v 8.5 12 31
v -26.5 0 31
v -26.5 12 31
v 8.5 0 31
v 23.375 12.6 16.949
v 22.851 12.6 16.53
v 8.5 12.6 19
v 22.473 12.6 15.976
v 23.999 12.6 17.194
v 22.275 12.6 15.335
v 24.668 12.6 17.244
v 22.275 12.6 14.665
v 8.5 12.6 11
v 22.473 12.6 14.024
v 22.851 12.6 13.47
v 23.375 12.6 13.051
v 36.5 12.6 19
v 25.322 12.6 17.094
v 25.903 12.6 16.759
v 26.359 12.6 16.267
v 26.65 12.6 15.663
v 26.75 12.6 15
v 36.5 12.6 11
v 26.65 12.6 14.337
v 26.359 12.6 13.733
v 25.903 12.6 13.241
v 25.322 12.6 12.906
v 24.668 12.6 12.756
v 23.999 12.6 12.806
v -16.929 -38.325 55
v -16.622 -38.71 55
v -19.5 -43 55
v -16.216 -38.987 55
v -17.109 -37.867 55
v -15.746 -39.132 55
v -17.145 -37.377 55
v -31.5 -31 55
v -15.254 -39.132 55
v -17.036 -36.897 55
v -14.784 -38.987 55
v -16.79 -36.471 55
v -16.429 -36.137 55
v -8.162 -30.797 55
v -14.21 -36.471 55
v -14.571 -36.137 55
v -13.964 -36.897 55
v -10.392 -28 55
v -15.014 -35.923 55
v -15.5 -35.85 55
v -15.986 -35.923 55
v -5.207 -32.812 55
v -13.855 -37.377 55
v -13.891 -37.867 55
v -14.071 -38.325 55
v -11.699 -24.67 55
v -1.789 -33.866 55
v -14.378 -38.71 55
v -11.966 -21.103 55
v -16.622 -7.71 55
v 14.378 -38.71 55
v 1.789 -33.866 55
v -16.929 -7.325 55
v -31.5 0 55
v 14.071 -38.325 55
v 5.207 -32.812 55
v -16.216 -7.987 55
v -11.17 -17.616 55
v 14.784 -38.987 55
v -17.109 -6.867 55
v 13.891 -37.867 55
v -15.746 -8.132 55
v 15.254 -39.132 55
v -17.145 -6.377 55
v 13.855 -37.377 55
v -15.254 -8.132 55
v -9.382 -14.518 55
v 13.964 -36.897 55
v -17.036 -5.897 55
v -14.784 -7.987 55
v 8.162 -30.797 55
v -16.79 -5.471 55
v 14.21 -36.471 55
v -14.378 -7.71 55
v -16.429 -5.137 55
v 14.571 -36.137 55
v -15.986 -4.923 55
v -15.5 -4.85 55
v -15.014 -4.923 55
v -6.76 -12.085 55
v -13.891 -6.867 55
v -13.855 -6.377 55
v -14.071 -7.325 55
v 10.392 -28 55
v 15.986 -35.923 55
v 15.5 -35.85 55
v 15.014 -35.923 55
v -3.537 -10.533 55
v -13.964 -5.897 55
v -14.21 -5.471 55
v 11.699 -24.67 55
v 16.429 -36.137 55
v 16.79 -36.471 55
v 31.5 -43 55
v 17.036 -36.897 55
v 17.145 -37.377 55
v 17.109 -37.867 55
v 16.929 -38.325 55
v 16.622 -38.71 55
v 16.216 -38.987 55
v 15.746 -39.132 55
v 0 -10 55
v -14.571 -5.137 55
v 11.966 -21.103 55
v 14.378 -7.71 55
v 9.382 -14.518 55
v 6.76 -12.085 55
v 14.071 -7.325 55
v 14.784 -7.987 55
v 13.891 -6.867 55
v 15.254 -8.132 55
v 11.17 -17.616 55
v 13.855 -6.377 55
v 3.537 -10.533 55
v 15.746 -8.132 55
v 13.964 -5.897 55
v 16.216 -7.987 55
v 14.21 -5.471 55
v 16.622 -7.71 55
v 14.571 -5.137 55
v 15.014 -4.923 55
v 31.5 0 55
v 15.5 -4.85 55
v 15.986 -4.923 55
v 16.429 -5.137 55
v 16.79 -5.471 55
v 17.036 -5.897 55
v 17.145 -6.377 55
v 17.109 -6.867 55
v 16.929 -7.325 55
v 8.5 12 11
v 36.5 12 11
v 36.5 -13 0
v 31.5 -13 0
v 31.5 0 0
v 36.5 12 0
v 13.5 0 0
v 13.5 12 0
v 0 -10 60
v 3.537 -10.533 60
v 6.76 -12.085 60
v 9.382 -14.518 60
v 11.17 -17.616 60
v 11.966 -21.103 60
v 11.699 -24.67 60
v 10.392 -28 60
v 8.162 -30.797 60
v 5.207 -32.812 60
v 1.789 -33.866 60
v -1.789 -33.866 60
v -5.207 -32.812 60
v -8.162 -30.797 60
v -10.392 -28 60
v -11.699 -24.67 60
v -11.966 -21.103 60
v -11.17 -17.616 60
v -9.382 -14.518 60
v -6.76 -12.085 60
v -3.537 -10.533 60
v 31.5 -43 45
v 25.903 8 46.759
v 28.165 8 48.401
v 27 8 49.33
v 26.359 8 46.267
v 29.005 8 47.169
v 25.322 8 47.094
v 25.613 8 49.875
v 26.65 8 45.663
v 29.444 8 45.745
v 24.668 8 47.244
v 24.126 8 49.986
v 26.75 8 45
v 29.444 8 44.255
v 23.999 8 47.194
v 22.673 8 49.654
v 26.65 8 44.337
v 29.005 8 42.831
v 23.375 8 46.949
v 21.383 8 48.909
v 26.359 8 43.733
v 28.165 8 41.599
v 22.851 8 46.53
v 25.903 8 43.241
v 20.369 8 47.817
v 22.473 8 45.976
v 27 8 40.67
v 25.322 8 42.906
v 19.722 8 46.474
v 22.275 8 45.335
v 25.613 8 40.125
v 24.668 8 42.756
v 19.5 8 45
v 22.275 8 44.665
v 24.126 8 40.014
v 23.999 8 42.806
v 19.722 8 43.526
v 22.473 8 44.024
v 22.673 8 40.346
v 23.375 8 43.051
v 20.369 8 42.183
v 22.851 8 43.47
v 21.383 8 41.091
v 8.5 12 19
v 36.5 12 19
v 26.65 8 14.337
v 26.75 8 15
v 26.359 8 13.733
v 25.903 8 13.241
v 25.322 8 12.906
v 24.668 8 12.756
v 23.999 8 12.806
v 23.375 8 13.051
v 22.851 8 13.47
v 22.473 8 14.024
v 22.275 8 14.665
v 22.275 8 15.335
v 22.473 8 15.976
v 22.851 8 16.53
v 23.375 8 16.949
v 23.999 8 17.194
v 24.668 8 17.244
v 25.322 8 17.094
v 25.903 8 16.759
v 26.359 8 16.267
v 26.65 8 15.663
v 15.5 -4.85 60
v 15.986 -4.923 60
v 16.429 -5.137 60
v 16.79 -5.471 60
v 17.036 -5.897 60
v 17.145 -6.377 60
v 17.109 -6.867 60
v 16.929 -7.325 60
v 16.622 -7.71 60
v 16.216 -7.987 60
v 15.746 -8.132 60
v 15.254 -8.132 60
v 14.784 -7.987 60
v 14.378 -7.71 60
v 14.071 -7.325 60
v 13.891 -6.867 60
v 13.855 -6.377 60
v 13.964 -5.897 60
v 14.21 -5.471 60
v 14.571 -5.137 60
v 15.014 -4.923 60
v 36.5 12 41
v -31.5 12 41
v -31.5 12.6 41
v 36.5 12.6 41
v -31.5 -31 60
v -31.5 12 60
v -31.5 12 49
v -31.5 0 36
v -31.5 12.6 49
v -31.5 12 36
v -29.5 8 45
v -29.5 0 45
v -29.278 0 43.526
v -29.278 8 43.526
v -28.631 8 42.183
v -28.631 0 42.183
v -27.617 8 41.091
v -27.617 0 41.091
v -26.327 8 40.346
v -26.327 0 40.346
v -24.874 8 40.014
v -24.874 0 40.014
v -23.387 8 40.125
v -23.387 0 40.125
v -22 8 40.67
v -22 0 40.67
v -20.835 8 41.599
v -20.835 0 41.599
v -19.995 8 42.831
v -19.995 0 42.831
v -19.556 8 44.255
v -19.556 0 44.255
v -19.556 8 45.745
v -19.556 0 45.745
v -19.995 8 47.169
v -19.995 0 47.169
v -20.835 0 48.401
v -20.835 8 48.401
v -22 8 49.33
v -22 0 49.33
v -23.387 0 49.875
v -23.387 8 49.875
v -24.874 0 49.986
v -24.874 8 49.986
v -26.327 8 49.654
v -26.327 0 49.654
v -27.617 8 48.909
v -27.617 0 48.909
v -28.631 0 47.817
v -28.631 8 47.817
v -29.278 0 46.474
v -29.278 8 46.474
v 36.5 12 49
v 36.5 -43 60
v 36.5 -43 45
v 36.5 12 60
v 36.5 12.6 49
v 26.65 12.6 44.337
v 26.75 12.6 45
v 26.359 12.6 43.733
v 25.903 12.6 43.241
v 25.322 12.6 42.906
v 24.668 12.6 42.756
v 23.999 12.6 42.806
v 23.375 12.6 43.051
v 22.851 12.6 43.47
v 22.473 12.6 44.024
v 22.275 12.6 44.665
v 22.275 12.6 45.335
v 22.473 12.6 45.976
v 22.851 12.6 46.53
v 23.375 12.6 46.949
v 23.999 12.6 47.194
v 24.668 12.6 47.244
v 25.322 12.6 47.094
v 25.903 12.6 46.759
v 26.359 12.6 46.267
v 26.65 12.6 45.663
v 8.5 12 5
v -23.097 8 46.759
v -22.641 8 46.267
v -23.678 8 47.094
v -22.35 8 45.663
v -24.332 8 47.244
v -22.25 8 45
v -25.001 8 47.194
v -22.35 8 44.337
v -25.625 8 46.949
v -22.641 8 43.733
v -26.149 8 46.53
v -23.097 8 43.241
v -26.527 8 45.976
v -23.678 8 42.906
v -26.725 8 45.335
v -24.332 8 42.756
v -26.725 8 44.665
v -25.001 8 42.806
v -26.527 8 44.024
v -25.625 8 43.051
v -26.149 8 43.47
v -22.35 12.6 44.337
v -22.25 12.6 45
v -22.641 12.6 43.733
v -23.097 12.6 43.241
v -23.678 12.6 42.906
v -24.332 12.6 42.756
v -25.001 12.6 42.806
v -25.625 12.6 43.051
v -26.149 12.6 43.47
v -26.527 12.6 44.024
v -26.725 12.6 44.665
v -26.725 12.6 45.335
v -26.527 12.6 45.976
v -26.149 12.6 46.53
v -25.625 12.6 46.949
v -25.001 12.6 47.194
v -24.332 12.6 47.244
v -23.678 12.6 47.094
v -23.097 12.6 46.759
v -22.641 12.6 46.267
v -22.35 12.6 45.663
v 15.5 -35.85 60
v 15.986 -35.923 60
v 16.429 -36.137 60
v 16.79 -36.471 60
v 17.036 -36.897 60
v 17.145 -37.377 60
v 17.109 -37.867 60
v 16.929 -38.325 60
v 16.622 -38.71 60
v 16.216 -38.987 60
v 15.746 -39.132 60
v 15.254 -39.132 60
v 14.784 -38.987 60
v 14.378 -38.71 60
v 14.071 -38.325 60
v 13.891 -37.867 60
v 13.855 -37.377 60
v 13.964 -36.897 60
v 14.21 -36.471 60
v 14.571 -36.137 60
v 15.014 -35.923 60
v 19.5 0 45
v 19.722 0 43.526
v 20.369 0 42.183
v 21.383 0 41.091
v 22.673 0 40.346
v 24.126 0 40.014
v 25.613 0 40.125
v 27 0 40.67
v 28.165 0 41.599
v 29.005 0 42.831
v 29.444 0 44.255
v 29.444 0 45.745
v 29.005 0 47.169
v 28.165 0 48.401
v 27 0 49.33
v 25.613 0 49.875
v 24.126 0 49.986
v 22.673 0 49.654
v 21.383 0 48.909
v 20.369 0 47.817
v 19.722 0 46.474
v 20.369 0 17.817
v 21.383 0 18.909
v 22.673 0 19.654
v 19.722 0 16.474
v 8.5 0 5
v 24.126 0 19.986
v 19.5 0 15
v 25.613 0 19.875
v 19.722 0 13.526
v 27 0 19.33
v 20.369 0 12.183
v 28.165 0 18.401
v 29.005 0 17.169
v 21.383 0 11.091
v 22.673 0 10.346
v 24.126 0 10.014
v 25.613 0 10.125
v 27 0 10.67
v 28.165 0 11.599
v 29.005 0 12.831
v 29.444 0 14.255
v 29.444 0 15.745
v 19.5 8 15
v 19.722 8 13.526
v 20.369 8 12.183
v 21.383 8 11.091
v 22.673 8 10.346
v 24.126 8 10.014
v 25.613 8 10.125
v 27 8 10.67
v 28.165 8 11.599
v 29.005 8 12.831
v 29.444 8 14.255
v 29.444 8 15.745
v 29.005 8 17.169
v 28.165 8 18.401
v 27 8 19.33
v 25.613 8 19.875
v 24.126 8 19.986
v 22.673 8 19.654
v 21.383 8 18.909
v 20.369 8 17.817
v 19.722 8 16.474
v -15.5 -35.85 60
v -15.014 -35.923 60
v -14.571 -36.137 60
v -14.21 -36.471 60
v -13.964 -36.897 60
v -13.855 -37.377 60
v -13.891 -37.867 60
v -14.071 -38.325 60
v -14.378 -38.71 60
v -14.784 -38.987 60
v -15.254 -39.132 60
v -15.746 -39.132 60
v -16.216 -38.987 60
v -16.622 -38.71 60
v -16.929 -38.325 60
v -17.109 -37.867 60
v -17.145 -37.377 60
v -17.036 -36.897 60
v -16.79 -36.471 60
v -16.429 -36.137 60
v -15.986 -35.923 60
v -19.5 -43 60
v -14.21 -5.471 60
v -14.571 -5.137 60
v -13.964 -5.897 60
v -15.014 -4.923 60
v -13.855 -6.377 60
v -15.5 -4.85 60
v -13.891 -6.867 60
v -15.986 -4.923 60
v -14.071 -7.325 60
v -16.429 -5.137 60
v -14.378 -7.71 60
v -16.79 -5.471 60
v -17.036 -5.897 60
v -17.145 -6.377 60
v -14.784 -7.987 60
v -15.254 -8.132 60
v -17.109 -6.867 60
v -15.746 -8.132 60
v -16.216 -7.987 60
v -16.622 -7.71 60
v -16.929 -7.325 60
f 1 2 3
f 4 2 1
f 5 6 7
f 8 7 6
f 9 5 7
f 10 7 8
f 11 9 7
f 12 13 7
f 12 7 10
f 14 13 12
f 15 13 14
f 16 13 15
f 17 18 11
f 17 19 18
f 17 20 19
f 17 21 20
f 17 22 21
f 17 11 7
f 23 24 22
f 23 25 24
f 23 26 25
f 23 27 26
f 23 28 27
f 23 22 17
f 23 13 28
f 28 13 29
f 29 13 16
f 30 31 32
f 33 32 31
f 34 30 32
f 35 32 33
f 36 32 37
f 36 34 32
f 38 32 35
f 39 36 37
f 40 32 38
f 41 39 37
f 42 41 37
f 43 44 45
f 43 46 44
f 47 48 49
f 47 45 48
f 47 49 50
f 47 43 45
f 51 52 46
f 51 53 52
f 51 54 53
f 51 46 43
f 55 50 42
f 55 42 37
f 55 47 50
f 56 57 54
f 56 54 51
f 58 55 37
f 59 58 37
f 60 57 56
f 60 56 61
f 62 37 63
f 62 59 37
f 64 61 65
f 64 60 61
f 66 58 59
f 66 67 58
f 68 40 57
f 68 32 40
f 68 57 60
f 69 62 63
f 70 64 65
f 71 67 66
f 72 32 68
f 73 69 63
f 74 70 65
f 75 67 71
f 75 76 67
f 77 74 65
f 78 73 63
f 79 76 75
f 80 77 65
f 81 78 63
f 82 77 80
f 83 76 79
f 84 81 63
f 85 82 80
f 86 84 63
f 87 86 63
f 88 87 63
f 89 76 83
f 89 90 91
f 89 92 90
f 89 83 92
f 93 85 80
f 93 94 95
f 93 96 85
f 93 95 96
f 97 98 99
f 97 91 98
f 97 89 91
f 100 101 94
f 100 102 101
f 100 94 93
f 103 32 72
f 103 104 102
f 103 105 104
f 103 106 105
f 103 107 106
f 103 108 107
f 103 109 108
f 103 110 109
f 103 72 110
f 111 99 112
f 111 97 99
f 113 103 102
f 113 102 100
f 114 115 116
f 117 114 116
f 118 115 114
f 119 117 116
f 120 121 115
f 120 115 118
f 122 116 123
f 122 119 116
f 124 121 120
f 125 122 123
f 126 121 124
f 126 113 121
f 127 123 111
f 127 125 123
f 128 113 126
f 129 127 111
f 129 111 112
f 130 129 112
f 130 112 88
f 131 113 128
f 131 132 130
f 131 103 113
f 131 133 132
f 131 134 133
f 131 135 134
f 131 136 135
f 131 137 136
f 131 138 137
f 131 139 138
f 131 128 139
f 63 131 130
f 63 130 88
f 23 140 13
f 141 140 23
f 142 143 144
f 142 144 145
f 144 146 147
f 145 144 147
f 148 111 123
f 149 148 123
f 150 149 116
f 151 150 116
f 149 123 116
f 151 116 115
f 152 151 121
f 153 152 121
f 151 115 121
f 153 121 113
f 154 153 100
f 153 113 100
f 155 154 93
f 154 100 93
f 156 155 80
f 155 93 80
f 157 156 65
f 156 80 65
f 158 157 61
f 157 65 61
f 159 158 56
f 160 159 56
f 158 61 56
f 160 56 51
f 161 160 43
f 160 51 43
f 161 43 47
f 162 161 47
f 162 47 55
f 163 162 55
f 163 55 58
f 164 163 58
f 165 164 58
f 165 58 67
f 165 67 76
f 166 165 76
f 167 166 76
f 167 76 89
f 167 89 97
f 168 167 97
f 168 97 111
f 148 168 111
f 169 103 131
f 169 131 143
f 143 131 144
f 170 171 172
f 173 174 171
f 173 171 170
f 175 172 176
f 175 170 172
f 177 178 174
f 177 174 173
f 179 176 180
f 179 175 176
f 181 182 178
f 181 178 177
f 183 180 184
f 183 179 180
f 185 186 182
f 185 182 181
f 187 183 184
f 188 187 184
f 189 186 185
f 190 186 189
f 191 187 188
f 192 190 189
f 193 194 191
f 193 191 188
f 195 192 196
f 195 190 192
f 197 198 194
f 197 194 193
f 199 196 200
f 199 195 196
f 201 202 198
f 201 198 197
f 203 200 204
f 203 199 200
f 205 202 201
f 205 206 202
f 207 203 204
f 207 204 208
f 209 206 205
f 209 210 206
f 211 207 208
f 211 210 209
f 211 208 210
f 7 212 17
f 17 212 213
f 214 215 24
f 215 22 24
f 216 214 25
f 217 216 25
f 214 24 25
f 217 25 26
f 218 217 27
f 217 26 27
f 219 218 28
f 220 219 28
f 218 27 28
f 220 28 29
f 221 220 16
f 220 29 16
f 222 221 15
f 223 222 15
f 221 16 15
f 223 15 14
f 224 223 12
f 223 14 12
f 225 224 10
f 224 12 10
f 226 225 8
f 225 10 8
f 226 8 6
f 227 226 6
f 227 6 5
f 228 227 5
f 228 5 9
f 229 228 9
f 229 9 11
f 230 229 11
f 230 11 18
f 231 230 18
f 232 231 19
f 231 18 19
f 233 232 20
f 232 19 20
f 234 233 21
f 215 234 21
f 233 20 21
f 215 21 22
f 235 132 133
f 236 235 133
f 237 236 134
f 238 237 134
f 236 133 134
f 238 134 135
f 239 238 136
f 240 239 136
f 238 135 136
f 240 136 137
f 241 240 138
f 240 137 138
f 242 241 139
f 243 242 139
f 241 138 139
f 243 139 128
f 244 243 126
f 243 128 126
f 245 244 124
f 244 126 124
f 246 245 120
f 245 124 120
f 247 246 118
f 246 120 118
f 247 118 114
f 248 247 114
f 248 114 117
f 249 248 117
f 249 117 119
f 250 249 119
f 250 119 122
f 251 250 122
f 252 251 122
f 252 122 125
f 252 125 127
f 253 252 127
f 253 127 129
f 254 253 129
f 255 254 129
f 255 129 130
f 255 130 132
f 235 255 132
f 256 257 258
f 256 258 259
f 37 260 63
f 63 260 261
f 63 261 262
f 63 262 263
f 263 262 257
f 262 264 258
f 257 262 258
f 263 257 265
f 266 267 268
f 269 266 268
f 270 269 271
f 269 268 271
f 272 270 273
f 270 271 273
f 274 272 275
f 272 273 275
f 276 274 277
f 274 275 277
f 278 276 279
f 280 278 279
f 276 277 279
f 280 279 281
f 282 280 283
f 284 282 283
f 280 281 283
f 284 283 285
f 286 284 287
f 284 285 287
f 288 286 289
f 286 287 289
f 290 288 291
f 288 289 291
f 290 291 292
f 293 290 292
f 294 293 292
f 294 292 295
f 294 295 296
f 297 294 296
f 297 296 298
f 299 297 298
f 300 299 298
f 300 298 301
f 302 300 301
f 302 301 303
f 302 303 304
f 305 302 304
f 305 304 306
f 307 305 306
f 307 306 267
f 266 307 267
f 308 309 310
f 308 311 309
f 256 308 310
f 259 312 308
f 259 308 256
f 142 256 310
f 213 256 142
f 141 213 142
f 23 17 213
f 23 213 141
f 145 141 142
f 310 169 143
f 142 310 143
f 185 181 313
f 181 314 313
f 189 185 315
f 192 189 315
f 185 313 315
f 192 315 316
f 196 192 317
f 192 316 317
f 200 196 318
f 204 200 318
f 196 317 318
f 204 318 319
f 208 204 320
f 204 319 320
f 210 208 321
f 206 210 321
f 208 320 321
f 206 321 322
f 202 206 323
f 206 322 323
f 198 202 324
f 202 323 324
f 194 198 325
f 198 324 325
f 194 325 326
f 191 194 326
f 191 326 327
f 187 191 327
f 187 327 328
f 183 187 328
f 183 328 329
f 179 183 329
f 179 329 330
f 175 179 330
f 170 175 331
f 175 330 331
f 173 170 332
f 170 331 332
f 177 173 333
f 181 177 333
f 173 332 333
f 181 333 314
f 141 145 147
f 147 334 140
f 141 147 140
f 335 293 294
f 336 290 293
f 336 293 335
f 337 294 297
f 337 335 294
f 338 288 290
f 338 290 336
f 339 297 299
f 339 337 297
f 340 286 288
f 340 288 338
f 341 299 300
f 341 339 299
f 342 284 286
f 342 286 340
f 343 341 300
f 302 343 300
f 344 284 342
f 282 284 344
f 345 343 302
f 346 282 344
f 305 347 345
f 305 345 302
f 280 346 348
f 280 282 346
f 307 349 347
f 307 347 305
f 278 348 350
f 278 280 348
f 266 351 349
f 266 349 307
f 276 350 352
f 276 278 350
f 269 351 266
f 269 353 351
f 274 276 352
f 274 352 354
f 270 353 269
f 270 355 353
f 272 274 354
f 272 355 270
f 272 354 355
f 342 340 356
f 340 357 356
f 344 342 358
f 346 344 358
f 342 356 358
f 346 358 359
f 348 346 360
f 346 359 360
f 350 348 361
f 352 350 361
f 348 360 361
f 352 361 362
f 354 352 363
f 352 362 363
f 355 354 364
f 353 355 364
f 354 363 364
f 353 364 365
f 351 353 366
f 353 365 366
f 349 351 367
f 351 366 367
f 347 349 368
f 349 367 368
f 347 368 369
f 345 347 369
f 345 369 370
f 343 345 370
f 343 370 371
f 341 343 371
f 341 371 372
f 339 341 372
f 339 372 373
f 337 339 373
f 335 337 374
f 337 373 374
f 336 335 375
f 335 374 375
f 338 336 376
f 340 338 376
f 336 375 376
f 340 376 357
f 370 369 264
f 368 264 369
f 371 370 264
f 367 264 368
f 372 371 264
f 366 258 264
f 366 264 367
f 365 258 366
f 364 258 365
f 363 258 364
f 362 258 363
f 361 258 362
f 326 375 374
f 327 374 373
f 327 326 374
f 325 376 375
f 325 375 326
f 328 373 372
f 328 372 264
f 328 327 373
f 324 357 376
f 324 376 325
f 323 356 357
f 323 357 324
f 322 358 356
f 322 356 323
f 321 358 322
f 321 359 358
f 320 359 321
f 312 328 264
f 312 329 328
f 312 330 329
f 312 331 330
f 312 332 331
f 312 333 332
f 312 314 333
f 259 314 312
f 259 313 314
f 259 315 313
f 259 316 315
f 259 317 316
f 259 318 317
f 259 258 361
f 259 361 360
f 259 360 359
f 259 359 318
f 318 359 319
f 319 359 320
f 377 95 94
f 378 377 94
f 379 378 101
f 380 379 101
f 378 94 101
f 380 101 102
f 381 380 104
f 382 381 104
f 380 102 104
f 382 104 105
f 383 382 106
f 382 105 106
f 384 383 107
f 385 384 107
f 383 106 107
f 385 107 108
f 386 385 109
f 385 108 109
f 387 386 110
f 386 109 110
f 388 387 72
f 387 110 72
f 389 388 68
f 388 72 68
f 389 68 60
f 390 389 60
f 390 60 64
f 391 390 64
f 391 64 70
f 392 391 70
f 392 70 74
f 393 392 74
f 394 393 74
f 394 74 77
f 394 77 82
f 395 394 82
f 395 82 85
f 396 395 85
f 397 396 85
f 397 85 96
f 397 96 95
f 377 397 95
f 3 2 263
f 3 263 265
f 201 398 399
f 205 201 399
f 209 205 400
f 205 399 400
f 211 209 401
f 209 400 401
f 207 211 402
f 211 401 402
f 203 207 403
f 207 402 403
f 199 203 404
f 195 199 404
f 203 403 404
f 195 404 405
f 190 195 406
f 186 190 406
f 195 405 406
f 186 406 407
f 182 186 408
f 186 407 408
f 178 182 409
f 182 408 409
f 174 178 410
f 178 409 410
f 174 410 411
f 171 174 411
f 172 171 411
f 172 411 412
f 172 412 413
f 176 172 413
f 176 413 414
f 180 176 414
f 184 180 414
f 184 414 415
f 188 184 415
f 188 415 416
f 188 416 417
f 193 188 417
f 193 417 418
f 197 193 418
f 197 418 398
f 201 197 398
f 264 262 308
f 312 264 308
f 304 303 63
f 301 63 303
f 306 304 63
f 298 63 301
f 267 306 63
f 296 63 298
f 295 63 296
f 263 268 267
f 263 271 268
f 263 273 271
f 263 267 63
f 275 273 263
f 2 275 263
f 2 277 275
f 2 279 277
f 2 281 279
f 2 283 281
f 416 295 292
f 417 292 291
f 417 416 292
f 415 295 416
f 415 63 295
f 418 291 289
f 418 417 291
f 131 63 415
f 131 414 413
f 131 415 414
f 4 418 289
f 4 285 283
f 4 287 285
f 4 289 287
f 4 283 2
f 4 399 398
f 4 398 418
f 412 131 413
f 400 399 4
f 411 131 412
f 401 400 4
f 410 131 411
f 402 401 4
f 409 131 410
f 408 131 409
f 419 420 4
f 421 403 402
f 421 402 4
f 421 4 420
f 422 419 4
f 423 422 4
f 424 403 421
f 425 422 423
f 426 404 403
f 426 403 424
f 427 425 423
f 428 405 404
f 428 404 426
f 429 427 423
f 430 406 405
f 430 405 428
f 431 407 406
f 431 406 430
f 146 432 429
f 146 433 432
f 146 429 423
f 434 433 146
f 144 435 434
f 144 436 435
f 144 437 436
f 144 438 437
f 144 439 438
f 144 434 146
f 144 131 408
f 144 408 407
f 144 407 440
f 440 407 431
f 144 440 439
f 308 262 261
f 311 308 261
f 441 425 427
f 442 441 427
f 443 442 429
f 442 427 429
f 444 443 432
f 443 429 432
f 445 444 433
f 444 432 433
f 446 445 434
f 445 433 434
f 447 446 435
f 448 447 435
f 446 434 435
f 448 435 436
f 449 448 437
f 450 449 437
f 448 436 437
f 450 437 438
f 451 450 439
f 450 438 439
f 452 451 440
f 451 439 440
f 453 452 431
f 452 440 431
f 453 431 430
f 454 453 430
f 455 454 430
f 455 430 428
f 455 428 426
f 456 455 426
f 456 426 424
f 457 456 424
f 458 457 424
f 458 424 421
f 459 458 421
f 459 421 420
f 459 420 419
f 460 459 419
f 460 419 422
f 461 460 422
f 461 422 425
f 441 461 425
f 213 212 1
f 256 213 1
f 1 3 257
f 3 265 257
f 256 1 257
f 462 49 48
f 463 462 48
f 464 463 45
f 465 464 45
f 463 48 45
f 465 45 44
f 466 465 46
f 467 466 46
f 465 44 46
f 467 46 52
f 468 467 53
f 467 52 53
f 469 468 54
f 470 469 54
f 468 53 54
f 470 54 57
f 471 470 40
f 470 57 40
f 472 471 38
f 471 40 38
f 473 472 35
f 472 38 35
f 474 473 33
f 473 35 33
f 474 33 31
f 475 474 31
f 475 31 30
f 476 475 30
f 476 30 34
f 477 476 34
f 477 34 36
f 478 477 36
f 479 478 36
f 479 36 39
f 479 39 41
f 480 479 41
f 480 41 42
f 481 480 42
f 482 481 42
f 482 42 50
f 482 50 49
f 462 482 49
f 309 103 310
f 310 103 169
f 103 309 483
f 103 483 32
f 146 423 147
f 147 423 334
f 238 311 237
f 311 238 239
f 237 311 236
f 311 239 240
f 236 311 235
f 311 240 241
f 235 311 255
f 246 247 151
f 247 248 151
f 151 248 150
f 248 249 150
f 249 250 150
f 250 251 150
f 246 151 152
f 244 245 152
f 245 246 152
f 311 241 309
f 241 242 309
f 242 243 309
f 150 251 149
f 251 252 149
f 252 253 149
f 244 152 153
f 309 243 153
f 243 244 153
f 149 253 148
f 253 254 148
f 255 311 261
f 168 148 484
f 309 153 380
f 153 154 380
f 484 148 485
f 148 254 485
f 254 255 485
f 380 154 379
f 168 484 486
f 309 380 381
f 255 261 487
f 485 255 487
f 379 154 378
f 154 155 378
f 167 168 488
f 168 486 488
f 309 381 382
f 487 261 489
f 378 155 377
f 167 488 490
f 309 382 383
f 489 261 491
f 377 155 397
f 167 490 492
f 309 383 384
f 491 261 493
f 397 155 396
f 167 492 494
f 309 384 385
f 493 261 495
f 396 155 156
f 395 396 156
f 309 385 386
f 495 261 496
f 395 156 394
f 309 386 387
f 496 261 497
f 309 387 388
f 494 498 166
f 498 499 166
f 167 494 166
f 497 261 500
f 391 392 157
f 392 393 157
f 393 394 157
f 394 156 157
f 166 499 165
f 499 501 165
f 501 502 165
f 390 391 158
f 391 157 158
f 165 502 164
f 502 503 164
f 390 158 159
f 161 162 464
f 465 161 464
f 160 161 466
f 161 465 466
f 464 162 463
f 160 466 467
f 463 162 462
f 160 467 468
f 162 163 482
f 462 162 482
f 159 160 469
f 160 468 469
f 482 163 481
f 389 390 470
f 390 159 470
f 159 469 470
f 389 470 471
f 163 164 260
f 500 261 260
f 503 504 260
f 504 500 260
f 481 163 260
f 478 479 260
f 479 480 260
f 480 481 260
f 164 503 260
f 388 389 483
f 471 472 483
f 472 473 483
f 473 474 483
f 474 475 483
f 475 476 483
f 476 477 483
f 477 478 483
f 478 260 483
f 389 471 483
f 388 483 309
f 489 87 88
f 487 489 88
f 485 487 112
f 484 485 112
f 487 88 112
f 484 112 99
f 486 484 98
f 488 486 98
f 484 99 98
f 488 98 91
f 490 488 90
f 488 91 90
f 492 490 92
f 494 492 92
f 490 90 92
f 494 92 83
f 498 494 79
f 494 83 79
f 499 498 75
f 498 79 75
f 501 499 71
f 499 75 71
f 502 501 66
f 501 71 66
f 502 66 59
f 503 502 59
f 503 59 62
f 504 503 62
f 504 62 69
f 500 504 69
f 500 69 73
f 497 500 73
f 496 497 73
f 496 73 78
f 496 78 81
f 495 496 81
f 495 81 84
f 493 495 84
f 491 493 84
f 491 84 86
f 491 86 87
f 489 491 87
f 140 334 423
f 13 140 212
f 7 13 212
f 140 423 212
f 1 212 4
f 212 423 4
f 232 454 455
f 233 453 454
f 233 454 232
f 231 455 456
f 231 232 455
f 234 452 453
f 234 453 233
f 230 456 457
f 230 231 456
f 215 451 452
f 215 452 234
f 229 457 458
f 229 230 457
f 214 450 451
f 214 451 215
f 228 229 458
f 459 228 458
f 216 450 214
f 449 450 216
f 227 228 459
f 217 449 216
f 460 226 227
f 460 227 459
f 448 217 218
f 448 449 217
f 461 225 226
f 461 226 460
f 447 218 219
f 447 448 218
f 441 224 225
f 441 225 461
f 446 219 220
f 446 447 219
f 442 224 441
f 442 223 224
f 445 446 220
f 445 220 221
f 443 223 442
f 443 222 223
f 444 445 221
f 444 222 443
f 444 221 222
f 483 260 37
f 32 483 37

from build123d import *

# Parameters (mm, degrees)
BOSS_EXTRUDE1_DEPTH                                 = 31.5
SKETCH2_R                                           = 12
SKETCH2_R_2                                         = 1.65
CUT_EXTRUDE1_DEPTH                                  = 77.591448609
SKETCH3_W                                           = 40
SKETCH3_H                                           = 31
CUT_EXTRUDE2_DEPTH                                  = 81.257398413
BOSS_EXTRUDE2_DEPTH                                 = 5
SKETCH8_W                                           = 68
SKETCH8_H                                           = 8
SKETCH8_W_2                                         = 28
BOSS_EXTRUDE3_DEPTH                                 = 0.6
CBORE_FOR_M4_HEX_SOCKET_HEAD_CAP_SCREW1_D           = 4.5
CBORE_FOR_M4_HEX_SOCKET_HEAD_CAP_SCREW1_CBORE_D     = 10
CBORE_FOR_M4_HEX_SOCKET_HEAD_CAP_SCREW1_CBORE_DEPTH = 8
CHAMFER1_SIZE                                       = 12
CHAMFER2_SIZE                                       = 5


with BuildPart() as part:
    # Sketch1 → Boss-Extrude1 (new, symmetric)
    with BuildSketch(Plane(origin=(0, 0, 0), x_dir=(0, 0, -1), z_dir=(1, 0, 0))):
        Polygon((-55, 0), (0, 0), (0, 12), (-60, 12), (-60, -43), (-55, -43), align=None)
    extrude(amount=BOSS_EXTRUDE1_DEPTH, both=True)

    # Sketch2 → Cut-Extrude1 (cut, through all)
    with BuildSketch(Plane(origin=(0, 0, 55), x_dir=(-1, 0, 0), z_dir=(0, 0, -1))):
        with Locations(Location((0, -22, 0), (0, 0, 90))):
            Circle(SKETCH2_R)
        with Locations(Location((-15.5, -6.5, 0), (0, 0, 90))):
            Circle(SKETCH2_R_2)
        with Locations(Location((-15.5, -37.5, 0), (0, 0, 90))):
            Circle(SKETCH2_R_2)
        with Locations(Location((15.5, -37.5, 0), (0, 0, 90))):
            Circle(SKETCH2_R_2)
        with Locations(Location((15.5, -6.5, 0), (0, 0, 90))):
            Circle(SKETCH2_R_2)
    extrude(amount=-CUT_EXTRUDE1_DEPTH, mode=Mode.SUBTRACT)

    # Sketch3 → Cut-Extrude2 (cut, through all)
    with BuildSketch(Plane.XZ):
        with Locations((-11.5, 15.5)):
            Rectangle(SKETCH3_W, SKETCH3_H)
    extrude(amount=-CUT_EXTRUDE2_DEPTH, mode=Mode.SUBTRACT)

    # Sketch7 → Boss-Extrude2 (add)
    with BuildSketch(Plane(origin=(31.5, 0, 0), x_dir=(0, 0, -1), z_dir=(1, 0, 0))):
        Polygon((-60, -43), (-45, -43), (0, -13), (0, 12), (-60, 12), align=None)
    extrude(amount=BOSS_EXTRUDE2_DEPTH)

    # Sketch8 → Boss-Extrude3 (add)
    with BuildSketch(Plane(origin=(0, 12, 0), x_dir=(1, 0, 0), z_dir=(0, 1, 0))):
        with Locations((2.5, -45)):
            Rectangle(SKETCH8_W, SKETCH8_H)
        with Locations((22.5, -15)):
            Rectangle(SKETCH8_W_2, SKETCH8_H)
    extrude(amount=BOSS_EXTRUDE3_DEPTH)

    # CBORE for M4 Hex Socket Head Cap Screw1 (through all)
    with Locations(Plane(origin=(0, 0, 0), x_dir=(-1, 0, 0), z_dir=(0, -1, 0))):
        with Locations((24.5, -45), (-24.5, -45), (-24.5, -15)):
            CounterBoreHole(CBORE_FOR_M4_HEX_SOCKET_HEAD_CAP_SCREW1_D / 2, CBORE_FOR_M4_HEX_SOCKET_HEAD_CAP_SCREW1_CBORE_D / 2, CBORE_FOR_M4_HEX_SOCKET_HEAD_CAP_SCREW1_CBORE_DEPTH)

    # Chamfer1
    chamfer1_edges = [part.edges().sort_by_distance(p)[0] for p in [
        (-31.5, -43, 57.5),
    ]]
    chamfer(chamfer1_edges, length=CHAMFER1_SIZE)

    # Chamfer2
    chamfer2_edges = [part.edges().sort_by_distance(p)[0] for p in [
        (-31.5, 6, 31),
        (8.5, 6, 0),
    ]]
    chamfer(chamfer2_edges, length=CHAMFER2_SIZE)


solid = part.part
